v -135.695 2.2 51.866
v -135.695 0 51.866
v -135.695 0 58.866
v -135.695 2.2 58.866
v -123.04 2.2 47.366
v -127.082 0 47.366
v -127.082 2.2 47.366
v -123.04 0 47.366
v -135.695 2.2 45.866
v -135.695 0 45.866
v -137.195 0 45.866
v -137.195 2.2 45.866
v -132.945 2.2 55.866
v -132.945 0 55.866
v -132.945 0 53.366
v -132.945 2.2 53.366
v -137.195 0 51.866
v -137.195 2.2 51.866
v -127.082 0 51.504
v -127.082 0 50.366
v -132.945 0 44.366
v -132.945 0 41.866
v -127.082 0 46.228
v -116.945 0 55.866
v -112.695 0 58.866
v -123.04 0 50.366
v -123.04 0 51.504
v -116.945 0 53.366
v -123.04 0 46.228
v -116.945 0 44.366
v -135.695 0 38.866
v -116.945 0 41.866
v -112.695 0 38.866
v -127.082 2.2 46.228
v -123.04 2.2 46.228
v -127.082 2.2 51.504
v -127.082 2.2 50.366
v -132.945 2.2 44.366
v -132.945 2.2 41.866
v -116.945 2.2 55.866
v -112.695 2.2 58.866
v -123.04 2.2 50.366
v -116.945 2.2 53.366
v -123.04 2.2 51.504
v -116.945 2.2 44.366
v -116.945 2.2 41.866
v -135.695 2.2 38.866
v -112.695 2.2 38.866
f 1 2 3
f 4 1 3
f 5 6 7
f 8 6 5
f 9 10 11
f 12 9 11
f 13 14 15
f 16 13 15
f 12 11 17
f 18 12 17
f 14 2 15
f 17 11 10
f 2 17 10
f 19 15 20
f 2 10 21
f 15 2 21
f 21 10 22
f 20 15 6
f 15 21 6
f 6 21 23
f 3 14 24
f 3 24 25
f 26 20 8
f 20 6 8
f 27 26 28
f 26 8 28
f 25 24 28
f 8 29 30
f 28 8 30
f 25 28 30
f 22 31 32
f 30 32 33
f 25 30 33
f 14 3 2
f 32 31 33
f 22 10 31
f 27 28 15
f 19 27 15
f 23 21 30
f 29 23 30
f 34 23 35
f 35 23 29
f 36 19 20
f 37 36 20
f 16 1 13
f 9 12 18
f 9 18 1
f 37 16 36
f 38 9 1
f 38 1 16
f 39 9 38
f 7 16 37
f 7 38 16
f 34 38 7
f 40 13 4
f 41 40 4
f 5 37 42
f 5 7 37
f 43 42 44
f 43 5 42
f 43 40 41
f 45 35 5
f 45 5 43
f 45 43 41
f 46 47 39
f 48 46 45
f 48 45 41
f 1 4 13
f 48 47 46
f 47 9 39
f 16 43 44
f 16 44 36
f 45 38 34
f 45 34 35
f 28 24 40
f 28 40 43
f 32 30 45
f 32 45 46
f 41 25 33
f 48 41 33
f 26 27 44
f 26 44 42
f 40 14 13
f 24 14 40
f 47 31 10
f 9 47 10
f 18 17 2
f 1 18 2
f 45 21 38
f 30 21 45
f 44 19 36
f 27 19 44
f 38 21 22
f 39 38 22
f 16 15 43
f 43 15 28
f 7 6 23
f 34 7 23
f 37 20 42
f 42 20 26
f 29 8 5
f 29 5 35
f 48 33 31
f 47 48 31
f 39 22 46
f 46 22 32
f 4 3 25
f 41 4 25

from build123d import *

# Parameters (mm, degrees)
SKETCH1_W           = 16
SKETCH1_H           = 2.5
SKETCH1_W_2         = 4.041280146
SKETCH1_H_2         = 1.13793654
SKETCH1_H_3         = 1.137936541
BOSS_EXTRUDE1_DEPTH = 2.2


with BuildPart() as part:
    # Sketch1 → Boss-Extrude1 (new body)
    with BuildSketch(Plane(origin=(0, 0, 0), x_dir=(1, 0, 0), z_dir=(0, 1, 0))):
        Polygon((-135.695425431, -45.865904239), (-137.195425431, -45.865904239), (-137.195425431, -51.865904239), (-135.695425431, -51.865904239), (-135.695425431, -58.865904239), (-112.695425431, -58.865904239), (-112.695425431, -38.865904239), (-135.695425431, -38.865904239), align=None)
        with Locations((-124.945425431, -54.615904239)):
            Rectangle(SKETCH1_W, SKETCH1_H, mode=Mode.SUBTRACT)
        with Locations((-125.060873132, -50.934872509)):
            Rectangle(SKETCH1_W_2, SKETCH1_H_2, mode=Mode.SUBTRACT)
        with Locations((-125.060873132, -46.796935969)):
            Rectangle(SKETCH1_W_2, SKETCH1_H_3, mode=Mode.SUBTRACT)
        with Locations((-124.945425431, -43.115904239)):
            Rectangle(SKETCH1_W, SKETCH1_H, mode=Mode.SUBTRACT)
    extrude(amount=BOSS_EXTRUDE1_DEPTH)


solid = part.part
